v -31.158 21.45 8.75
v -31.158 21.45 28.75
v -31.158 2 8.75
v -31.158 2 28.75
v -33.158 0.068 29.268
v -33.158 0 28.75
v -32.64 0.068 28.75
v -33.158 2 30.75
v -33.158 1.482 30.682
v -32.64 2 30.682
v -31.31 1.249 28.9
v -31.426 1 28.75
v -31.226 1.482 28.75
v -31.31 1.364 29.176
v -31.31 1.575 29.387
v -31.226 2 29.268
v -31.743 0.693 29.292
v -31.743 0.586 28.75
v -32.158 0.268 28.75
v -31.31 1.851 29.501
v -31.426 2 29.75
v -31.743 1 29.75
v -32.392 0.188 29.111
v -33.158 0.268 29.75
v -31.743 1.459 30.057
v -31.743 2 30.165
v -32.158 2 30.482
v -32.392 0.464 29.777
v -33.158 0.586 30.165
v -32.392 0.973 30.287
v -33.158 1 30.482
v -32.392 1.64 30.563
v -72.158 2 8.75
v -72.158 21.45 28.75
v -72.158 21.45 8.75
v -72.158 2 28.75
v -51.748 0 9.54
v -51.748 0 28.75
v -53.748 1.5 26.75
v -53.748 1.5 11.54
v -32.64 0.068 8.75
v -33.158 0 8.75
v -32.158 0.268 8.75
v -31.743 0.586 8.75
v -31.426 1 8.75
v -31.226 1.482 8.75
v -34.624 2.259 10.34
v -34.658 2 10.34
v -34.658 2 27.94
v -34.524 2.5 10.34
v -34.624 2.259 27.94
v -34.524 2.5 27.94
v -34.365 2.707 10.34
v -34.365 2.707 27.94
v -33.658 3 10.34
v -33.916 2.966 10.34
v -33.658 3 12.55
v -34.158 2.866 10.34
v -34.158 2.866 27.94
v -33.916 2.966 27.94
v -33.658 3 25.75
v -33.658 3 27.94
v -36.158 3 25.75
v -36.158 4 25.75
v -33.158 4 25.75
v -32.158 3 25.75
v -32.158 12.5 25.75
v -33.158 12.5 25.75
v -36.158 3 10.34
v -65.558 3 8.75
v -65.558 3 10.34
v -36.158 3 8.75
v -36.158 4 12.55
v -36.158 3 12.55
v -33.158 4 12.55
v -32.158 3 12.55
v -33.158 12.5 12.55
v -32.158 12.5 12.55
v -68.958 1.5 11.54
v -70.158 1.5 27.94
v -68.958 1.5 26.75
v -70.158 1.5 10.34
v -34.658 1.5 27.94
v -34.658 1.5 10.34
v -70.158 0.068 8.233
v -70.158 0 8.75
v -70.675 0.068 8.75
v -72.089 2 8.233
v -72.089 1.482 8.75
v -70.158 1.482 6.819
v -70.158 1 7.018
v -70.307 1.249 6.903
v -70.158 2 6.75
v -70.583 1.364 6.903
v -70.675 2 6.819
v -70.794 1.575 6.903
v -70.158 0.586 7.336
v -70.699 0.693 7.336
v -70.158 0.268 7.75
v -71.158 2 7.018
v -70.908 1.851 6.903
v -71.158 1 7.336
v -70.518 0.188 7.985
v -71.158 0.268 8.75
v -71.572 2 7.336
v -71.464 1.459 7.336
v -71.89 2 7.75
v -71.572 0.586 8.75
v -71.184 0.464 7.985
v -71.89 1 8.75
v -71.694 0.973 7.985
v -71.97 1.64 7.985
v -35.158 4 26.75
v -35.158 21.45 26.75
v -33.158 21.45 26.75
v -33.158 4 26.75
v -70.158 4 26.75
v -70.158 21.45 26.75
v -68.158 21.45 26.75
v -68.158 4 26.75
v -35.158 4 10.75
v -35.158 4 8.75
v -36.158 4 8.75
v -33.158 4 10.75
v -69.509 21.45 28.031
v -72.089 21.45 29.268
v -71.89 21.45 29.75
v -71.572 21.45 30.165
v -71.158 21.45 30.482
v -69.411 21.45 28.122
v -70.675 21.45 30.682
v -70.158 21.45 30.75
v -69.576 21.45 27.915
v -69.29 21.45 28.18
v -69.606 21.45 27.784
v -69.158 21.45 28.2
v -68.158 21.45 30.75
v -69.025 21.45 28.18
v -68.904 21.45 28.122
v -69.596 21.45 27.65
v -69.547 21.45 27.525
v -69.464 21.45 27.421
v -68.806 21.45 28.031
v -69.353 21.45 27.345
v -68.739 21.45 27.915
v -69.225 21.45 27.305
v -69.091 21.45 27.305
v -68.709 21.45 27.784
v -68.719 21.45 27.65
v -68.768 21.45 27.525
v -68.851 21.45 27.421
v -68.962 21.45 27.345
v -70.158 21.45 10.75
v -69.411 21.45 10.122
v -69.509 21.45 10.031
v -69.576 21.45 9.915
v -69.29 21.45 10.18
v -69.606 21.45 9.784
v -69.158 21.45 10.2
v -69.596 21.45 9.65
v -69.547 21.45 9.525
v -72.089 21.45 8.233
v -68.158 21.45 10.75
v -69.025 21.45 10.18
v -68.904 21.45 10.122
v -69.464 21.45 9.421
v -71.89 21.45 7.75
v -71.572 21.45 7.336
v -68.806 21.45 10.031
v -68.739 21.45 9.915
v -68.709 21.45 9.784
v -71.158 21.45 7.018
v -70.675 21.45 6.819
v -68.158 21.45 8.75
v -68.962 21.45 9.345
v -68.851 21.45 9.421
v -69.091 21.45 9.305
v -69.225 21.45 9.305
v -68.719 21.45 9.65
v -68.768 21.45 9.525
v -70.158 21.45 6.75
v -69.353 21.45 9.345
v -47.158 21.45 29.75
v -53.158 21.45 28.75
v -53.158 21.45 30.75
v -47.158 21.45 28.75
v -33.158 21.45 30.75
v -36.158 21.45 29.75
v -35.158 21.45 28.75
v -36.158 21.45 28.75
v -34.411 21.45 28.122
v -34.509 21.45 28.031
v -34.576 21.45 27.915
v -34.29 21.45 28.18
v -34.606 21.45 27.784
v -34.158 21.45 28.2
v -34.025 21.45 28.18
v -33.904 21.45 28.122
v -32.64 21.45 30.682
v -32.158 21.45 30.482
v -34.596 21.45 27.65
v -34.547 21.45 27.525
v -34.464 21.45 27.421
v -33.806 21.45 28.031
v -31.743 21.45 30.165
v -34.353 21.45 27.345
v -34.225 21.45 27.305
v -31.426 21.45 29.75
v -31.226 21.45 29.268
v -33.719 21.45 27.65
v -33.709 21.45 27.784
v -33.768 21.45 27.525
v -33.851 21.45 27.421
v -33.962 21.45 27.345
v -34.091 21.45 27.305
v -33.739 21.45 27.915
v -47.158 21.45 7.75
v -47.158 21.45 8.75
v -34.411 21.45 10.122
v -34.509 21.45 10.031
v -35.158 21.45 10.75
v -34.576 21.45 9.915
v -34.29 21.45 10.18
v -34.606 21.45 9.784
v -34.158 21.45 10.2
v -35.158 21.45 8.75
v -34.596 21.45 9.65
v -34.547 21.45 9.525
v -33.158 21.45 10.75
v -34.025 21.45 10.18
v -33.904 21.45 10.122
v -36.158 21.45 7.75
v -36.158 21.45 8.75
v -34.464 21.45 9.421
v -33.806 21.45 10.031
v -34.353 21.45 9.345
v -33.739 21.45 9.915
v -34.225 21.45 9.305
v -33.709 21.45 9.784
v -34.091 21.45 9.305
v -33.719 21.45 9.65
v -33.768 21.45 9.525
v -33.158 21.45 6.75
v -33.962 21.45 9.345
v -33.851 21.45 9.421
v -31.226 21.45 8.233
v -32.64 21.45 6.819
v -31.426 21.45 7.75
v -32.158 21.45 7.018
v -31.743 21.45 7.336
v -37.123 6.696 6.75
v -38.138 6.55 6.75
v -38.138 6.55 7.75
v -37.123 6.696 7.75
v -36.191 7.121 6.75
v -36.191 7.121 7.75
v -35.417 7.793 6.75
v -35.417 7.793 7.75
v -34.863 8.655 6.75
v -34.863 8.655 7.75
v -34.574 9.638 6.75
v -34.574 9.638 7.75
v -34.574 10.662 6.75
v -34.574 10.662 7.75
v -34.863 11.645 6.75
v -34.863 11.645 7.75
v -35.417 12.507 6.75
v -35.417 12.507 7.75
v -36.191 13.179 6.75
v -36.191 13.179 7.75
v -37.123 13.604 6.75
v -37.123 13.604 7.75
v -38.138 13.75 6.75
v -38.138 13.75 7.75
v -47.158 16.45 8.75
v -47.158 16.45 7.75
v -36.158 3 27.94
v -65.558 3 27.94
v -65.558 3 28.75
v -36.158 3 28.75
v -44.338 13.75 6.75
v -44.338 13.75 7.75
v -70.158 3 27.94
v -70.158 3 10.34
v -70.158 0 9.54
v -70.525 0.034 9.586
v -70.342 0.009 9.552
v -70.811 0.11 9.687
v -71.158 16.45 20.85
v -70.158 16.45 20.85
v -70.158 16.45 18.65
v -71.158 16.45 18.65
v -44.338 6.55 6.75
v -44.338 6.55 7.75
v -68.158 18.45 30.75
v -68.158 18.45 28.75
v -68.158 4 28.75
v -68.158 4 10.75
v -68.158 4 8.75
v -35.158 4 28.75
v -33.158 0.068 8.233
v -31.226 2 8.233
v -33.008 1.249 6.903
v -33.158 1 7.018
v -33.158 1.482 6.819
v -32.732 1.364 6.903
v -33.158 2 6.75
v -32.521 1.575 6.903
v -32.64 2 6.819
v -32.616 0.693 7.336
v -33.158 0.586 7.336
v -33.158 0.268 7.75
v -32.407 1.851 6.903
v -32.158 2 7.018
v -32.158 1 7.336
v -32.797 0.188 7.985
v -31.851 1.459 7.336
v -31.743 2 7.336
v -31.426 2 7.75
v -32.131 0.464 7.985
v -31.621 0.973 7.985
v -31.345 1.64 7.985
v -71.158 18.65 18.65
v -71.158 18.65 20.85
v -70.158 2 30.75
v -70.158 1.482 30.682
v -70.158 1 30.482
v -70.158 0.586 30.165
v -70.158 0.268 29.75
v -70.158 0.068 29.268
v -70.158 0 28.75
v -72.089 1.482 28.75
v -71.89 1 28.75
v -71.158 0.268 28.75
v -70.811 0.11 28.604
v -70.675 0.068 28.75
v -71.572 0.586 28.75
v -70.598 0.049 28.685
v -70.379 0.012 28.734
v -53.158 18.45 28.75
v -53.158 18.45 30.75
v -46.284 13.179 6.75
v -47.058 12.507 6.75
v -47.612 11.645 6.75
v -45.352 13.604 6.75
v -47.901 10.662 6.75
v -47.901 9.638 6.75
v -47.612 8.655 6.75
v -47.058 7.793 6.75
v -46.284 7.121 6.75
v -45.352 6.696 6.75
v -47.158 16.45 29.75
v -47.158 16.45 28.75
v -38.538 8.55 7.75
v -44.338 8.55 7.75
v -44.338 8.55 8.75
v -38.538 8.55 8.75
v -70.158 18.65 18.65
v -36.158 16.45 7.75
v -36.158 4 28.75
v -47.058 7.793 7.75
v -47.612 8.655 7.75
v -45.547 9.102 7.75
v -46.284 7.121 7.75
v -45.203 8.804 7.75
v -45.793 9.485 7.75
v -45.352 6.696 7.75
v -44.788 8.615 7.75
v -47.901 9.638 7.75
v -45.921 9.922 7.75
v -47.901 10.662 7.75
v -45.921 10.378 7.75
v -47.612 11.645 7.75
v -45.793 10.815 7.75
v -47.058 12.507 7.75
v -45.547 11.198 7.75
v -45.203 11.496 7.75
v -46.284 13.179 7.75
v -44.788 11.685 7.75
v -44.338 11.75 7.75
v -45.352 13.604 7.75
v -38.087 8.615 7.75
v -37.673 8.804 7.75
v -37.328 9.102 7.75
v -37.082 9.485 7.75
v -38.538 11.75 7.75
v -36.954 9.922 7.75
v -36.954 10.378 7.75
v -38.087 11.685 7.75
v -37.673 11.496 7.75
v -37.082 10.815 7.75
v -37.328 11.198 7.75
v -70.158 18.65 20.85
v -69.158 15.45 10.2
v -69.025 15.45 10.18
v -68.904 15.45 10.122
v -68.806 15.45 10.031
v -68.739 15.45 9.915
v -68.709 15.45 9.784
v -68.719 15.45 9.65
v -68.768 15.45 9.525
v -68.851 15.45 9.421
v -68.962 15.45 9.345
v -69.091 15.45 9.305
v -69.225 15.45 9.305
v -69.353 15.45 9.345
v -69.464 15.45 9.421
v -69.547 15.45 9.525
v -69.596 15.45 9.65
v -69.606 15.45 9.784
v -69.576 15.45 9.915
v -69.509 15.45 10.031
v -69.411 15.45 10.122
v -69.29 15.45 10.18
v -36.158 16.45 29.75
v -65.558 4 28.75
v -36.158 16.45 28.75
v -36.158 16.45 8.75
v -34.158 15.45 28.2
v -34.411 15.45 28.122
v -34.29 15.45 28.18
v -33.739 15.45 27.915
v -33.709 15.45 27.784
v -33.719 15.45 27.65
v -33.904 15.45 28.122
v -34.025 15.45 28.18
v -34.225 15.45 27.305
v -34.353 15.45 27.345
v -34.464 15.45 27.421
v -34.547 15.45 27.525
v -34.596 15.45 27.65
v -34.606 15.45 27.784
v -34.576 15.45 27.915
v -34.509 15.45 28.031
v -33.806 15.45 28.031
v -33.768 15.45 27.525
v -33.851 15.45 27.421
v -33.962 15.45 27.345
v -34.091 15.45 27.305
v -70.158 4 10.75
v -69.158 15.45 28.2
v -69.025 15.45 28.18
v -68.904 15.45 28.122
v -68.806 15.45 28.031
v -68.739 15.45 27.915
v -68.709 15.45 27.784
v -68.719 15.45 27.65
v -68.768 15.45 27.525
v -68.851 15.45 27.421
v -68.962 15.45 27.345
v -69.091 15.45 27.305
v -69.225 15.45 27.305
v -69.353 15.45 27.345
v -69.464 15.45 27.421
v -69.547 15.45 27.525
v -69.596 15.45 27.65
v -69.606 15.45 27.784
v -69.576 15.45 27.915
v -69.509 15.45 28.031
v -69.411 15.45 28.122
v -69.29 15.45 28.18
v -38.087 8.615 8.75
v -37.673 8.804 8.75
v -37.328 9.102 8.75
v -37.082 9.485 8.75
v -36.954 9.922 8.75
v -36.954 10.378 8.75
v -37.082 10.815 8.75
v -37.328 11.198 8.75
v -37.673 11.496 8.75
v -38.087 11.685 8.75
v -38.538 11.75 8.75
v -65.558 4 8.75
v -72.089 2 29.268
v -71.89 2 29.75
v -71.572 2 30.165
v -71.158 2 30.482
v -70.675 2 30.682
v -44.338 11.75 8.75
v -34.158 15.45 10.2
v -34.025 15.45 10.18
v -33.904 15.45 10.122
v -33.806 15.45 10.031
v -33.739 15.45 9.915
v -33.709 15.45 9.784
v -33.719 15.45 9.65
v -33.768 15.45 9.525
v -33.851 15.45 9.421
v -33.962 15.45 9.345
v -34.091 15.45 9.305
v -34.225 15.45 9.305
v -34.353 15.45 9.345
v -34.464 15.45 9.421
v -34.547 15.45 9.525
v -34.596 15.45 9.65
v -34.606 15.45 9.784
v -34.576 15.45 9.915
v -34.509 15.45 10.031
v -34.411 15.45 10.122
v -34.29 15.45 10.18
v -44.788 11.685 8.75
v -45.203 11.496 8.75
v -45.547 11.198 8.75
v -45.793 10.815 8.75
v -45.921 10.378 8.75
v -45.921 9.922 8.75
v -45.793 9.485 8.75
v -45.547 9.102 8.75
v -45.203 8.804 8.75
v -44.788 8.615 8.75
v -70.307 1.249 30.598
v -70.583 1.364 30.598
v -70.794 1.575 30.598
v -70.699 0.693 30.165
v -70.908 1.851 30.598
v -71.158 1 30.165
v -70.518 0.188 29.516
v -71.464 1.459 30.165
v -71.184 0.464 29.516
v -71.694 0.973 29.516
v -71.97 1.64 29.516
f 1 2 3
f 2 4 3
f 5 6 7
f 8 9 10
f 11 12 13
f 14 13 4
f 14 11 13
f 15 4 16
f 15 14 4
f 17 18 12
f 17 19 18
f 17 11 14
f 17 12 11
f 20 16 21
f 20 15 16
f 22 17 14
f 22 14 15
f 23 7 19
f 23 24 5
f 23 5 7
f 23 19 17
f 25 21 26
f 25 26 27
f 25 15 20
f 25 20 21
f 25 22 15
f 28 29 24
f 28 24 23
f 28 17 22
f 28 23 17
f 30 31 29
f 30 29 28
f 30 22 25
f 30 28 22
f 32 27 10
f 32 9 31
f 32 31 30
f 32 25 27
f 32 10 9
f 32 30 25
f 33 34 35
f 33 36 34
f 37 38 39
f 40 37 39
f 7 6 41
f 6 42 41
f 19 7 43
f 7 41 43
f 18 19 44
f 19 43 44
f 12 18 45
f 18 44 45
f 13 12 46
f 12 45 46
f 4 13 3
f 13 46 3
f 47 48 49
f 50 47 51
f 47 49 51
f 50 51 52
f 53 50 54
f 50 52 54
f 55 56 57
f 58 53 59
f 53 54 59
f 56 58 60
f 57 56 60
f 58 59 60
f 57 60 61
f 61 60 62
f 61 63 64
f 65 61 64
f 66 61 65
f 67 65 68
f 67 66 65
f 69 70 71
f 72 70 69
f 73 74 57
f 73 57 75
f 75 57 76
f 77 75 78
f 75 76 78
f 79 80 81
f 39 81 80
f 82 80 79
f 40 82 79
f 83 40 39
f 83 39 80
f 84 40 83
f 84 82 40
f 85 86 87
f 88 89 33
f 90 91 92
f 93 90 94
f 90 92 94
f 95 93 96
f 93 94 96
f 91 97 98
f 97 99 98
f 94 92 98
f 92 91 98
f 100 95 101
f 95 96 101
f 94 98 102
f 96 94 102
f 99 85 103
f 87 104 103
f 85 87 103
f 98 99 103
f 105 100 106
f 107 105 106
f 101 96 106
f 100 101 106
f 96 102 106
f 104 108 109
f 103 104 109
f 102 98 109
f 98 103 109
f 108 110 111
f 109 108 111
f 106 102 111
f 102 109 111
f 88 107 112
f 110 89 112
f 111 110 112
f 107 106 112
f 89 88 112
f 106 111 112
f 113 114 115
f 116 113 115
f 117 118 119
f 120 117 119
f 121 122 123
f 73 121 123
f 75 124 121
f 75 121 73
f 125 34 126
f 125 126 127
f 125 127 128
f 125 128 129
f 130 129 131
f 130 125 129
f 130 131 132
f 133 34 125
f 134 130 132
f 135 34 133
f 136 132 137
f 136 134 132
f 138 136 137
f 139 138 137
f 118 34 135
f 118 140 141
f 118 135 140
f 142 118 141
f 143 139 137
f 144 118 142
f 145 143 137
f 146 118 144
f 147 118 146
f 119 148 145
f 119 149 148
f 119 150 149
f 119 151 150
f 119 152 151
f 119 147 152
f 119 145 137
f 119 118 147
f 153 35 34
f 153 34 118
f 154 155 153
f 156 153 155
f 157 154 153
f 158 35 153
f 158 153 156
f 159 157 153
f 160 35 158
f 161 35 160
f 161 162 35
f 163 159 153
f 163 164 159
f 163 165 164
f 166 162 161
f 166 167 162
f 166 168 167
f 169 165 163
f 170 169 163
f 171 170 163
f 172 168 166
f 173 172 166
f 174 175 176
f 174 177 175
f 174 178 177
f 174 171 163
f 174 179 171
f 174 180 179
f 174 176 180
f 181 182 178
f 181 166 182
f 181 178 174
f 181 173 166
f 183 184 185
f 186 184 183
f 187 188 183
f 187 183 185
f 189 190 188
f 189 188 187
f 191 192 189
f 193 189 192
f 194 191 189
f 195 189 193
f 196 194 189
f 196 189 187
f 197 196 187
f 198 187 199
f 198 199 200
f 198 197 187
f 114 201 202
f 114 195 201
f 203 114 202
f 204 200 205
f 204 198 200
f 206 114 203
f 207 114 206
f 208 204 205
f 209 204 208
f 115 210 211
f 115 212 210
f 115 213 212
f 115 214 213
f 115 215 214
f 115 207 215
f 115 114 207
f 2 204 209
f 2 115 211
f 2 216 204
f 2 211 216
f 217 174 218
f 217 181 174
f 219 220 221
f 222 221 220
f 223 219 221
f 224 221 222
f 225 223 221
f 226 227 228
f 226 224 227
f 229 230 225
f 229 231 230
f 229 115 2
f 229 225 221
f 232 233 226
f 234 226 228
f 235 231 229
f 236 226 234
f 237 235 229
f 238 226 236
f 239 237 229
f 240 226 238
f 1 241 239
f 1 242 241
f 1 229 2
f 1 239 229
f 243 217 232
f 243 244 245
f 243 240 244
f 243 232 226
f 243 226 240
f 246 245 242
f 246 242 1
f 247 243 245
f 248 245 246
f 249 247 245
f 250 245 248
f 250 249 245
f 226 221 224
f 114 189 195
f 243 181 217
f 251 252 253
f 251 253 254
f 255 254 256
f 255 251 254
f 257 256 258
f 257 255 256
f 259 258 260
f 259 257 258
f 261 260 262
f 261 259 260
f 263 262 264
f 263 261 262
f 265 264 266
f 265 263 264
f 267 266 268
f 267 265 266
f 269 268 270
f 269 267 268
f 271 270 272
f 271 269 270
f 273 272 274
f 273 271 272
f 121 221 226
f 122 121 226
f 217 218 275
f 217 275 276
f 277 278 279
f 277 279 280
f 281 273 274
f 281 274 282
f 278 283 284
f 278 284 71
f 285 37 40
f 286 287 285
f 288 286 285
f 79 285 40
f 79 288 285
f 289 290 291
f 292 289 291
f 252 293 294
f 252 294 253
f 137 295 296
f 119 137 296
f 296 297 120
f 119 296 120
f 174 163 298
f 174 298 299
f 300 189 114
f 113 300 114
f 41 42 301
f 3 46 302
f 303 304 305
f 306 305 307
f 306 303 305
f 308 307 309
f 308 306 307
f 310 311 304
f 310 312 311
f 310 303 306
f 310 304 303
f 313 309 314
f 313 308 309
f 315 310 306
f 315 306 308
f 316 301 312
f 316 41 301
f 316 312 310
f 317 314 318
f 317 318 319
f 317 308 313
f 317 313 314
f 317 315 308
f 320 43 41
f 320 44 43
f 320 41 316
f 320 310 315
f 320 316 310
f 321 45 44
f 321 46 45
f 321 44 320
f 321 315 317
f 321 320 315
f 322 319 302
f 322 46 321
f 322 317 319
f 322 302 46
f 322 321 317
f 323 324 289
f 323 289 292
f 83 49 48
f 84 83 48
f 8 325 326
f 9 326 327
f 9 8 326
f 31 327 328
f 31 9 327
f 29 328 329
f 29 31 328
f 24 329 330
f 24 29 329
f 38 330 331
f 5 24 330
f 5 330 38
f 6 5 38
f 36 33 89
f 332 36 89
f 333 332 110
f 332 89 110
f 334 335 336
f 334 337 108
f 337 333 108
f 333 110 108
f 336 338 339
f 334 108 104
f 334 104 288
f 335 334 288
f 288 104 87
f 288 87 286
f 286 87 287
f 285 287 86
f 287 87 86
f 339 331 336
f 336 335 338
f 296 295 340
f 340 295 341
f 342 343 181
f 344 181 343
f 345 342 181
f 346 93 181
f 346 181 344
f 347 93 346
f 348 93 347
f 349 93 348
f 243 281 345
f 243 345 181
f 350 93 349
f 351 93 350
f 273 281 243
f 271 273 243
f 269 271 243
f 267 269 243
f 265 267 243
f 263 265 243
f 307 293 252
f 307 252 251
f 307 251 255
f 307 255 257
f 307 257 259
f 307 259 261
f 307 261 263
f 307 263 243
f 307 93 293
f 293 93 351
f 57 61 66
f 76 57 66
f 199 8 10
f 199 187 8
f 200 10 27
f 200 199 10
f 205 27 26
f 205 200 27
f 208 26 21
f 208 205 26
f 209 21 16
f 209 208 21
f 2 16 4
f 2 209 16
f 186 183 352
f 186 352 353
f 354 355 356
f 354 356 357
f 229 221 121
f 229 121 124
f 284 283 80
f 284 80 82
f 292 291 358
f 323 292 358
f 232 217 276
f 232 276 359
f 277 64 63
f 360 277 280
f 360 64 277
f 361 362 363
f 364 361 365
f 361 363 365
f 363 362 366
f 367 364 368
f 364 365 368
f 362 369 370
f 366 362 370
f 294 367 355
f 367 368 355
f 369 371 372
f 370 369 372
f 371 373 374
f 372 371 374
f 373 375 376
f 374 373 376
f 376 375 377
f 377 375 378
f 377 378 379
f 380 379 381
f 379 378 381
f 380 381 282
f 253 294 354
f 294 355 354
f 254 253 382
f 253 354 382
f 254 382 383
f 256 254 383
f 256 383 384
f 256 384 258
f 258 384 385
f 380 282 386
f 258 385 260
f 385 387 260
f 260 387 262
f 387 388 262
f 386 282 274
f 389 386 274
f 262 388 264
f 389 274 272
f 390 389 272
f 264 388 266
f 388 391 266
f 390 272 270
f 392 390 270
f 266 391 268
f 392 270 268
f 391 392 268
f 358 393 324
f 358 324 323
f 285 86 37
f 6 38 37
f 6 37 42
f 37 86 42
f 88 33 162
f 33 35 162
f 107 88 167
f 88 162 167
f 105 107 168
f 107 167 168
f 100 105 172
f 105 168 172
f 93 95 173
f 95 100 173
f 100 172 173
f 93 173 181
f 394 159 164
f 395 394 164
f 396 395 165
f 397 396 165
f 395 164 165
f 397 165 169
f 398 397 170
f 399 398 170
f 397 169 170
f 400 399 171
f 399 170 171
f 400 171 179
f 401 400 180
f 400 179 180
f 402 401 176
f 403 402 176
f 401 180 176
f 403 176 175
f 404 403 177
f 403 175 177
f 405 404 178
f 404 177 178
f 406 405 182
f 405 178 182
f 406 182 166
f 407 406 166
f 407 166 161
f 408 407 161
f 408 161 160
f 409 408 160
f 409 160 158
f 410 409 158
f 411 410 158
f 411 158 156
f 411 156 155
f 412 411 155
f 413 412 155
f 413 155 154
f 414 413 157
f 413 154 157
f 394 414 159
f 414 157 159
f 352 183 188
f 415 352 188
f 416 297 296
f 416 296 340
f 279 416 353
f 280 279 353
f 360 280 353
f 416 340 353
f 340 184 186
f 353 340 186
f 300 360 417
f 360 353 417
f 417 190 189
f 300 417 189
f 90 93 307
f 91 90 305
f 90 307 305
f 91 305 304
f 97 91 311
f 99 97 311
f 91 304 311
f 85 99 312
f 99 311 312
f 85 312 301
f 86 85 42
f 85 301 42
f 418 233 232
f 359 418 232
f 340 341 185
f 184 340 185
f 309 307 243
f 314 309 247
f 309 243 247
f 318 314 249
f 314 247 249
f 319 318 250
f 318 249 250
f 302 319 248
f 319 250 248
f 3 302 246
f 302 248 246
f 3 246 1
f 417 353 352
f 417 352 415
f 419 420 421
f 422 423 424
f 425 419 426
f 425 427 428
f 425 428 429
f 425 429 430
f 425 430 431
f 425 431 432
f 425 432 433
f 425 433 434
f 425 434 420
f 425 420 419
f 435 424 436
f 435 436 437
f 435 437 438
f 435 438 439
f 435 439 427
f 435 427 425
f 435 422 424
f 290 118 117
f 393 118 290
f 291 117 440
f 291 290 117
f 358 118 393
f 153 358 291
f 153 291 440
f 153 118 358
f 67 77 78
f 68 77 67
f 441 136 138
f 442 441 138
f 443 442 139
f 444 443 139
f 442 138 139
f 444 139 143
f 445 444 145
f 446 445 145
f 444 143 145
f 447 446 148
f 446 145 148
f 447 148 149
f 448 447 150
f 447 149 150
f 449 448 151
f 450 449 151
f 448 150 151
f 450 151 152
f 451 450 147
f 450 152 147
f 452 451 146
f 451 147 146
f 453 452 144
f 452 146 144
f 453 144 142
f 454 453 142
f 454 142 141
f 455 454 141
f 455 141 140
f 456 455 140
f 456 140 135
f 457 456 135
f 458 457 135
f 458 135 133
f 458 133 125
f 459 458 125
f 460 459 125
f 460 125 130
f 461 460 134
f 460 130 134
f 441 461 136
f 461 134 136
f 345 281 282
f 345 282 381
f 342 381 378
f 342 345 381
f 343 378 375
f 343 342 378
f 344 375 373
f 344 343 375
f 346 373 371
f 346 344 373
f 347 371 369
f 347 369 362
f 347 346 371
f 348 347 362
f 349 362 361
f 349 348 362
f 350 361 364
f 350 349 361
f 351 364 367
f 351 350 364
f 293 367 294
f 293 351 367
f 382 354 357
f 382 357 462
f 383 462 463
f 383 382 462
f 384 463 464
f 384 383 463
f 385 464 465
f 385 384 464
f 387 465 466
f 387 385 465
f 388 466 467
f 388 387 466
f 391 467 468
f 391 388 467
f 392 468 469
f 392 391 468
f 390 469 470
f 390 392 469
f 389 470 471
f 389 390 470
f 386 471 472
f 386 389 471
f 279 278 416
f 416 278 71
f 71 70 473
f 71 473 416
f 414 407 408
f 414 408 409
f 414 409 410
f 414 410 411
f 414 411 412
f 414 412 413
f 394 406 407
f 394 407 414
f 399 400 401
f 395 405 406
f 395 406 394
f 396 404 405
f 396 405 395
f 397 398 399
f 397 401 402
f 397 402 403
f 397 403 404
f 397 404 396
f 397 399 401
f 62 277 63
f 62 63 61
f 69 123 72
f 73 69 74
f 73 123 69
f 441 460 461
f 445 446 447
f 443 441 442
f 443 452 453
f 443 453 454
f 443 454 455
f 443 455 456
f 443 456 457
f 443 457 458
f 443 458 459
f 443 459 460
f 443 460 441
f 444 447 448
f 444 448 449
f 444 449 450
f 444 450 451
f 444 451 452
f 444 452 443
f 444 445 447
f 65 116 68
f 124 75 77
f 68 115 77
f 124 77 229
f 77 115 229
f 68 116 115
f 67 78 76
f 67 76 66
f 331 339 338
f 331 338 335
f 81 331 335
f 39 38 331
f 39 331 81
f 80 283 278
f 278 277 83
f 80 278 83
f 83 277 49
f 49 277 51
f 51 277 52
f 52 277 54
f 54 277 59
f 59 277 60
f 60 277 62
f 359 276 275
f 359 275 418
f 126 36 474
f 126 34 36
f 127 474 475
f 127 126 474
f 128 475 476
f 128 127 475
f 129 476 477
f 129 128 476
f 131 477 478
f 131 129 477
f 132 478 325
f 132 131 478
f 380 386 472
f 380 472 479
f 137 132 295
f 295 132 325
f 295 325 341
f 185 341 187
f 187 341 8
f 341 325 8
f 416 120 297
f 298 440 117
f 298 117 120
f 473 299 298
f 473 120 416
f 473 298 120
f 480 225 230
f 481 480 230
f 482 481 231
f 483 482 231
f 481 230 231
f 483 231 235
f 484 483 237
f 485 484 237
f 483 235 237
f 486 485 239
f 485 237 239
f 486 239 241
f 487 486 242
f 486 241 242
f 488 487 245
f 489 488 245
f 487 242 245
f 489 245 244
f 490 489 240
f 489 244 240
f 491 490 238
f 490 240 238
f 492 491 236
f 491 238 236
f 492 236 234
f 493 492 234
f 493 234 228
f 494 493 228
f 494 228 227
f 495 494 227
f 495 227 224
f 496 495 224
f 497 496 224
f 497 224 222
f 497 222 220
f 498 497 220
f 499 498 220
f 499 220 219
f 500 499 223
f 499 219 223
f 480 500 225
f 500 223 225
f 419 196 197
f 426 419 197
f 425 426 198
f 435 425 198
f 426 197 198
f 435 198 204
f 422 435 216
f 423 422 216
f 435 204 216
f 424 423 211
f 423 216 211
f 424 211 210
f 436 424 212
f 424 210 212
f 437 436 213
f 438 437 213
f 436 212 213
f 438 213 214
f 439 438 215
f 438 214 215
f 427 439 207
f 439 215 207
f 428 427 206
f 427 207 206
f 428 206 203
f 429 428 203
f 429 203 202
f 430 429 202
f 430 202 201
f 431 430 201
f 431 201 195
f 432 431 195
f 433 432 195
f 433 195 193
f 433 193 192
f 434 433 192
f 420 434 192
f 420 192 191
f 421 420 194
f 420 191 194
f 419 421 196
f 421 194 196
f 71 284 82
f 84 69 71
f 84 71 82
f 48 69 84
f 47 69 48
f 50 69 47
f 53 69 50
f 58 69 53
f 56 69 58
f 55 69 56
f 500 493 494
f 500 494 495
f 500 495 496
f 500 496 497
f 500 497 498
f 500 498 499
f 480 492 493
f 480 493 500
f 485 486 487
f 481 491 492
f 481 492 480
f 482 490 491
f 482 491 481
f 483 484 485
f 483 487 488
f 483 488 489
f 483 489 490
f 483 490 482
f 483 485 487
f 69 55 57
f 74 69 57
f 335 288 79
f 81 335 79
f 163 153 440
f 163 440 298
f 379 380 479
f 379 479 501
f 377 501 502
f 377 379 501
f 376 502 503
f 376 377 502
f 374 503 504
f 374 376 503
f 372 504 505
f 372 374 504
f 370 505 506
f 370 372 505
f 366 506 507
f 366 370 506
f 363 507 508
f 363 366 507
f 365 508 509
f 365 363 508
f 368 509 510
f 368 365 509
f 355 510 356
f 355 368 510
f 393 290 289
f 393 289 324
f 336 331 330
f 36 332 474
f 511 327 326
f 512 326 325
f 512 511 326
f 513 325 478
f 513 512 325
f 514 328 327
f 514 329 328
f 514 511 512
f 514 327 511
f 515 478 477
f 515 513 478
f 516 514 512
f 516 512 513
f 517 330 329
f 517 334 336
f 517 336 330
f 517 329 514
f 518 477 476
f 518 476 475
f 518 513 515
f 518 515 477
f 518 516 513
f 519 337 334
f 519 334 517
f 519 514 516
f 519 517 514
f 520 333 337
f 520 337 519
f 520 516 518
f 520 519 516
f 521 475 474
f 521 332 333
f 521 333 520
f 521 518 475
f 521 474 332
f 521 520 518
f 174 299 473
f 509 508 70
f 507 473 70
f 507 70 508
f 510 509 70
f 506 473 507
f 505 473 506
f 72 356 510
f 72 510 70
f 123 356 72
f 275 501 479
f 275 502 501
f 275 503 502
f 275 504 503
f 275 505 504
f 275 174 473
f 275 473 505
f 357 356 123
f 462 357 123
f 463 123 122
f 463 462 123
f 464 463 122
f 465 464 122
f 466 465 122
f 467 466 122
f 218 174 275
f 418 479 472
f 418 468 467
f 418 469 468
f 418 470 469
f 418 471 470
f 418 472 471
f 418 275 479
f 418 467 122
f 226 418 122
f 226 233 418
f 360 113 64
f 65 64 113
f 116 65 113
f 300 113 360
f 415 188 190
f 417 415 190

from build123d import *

# Parameters (mm, degrees)
SKETCH_1_W           = 41
SKETCH_1_H           = 24
EXTRUDE_1_DEPTH      = 21.45
SKETCH_2_W           = 37
SKETCH_2_H           = 20
CUT_EXTRUDE_1_DEPTH  = 18.45
SKETCH_4_W           = 15.21
SKETCH_4_H           = 15.21
CUT_EXTRUDE_2_DEPTH  = 15
SKETCH_6_W           = 15
SKETCH_6_H           = 3
CUT_EXTRUDE_4_DEPTH  = 5
CUT_EXTRUDE_7_DEPTH  = 1
CUT_EXTRUDE_8_DEPTH  = 1
SKETCH_11_W          = 35.5
SKETCH_11_H          = 17.6
CUT_EXTRUDE_10_DEPTH = 1.5
SKETCH_13_W          = 11
SKETCH_13_H          = 1
CUT_EXTRUDE_12_DEPTH = 5
FILLET_2_R           = 2
CHAMFER_2_SIZE       = 2
CHAMFER_2_SIZE_2     = 1.5
SKETCH_19_W          = 2.2
SKETCH_19_H          = 2.2
CUT_EXTRUDE_16_DEPTH = 1
SKETCH_21_W          = 3.8
SKETCH_21_H          = 1
SKETCH_21_W_2        = 3
EXTRUDE_4_DEPTH      = 3
FILLET_8_R           = 1
SKETCH_24_W          = 13.2
SKETCH_24_H          = 9.5
CUT_EXTRUDE_17_DEPTH = 1
EXTRUDE_6_REACH      = 80.427
SKETCH_27_W          = 4.6
SKETCH_27_H          = 1
SKETCH_28_W          = 2
SKETCH_28_H          = 2
EXTRUDE_7_DEPTH      = 17.45
SKETCH_29_R          = 0.45
CUT_EXTRUDE_18_DEPTH = 6


with BuildPart() as part:
    # 草图1 → 凸台-拉伸1 (new body)
    with BuildSketch(Plane(origin=(0, 0, 0), x_dir=(1, 0, 0), z_dir=(0, 1, 0))):
        with Locations((-51.657577391, -18.750418409)):
            Rectangle(SKETCH_1_W, SKETCH_1_H)
    extrude(amount=EXTRUDE_1_DEPTH)

    # 草图2 → 切除-拉伸1 (cut)
    with BuildSketch(Plane(origin=(0, 21.45, 0), x_dir=(1, 0, 0), z_dir=(0, 1, 0))):
        with Locations((-51.657577391, -18.750418409)):
            Rectangle(SKETCH_2_W, SKETCH_2_H)
    extrude(amount=-CUT_EXTRUDE_1_DEPTH, mode=Mode.SUBTRACT)

    # 草图4 → 切除-拉伸2 (cut)
    with BuildSketch(Plane(origin=(0, 0, 0), x_dir=(-1, 0, 0), z_dir=(0, -1, 0))):
        with Locations((61.352577391, -19.145418409)):
            Rectangle(SKETCH_4_W, SKETCH_4_H)
    extrude(amount=-CUT_EXTRUDE_2_DEPTH, mode=Mode.SUBTRACT)

    # 草图6 → 切除-拉伸4 (cut)
    with BuildSketch(Plane.XY.offset(30.750418409)):
        with Locations((-60.657577391, 19.95)):
            Rectangle(SKETCH_6_W, SKETCH_6_H)
    extrude(amount=-CUT_EXTRUDE_4_DEPTH, mode=Mode.SUBTRACT)

    # 草图7 → 切除-拉伸7 (cut)
    with BuildSketch(Plane(origin=(0, 0, 6.750418409), x_dir=(-1, 0, 0), z_dir=(0, 0, -1))):
        with BuildLine():
            Line((44.337577391, 6.55), (38.137577391, 6.55))
            ThreePointArc((38.137577391, 6.55), (34.537577391, 10.15), (38.137577391, 13.75))
            Line((38.137577391, 13.75), (44.337577391, 13.75))
            ThreePointArc((44.337577391, 13.75), (47.937577391, 10.15), (44.337577391, 6.55))
        make_face()
    extrude(amount=-CUT_EXTRUDE_7_DEPTH, mode=Mode.SUBTRACT)

    # 草图9 → 切除-拉伸8 (cut)
    with BuildSketch(Plane(origin=(0, 0, 7.750418409), x_dir=(-1, 0, 0), z_dir=(0, 0, -1))):
        with BuildLine():
            Line((44.337577391, 8.55), (38.537577391, 8.55))
            ThreePointArc((38.537577391, 8.55), (36.937577391, 10.15), (38.537577391, 11.75))
            Line((38.537577391, 11.75), (44.337577391, 11.75))
            ThreePointArc((44.337577391, 11.75), (45.937577391, 10.15), (44.337577391, 8.55))
        make_face()
    extrude(amount=-CUT_EXTRUDE_8_DEPTH, mode=Mode.SUBTRACT)

    # 草图11 → 切除-拉伸10 (cut)
    with BuildSketch(Plane(origin=(0, 3, 0), x_dir=(1, 0, 0), z_dir=(0, 1, 0))):
        with Locations((-52.407577391, -19.140418409)):
            Rectangle(SKETCH_11_W, SKETCH_11_H)
    extrude(amount=-CUT_EXTRUDE_10_DEPTH, mode=Mode.SUBTRACT)

    # 草图13 → 切除-拉伸12 (cut)
    with BuildSketch(Plane(origin=(0, 21.45, 0), x_dir=(1, 0, 0), z_dir=(0, 1, 0))):
        with Locations((-41.657577391, -29.250418409)):
            Rectangle(SKETCH_13_W, SKETCH_13_H)
        with Locations((-41.657577391, -8.250418409)):
            Rectangle(SKETCH_13_W, SKETCH_13_H)
    extrude(amount=-CUT_EXTRUDE_12_DEPTH, mode=Mode.SUBTRACT)

    # 圆角2
    fillet_2_edges = [part.edges().sort_by_distance(p)[0] for p in [
        (-72.157577391, 0, 18.750418409),
        (-51.657577391, 0, 30.750418409),
        (-31.157577391, 0, 18.750418409),
        (-51.657577391, 0, 6.750418409),
        (-72.157577391, 10.725, 6.750418409),
        (-72.157577391, 10.725, 30.750418409),
        (-31.157577391, 10.725, 30.750418409),
        (-31.157577391, 10.725, 6.750418409),
    ]]
    fillet(fillet_2_edges, radius=FILLET_2_R)

    # 倒角2
    # the kernel refuses this chamfer: 2, 1.5 mm, written as the material it takes off along each edge
    with BuildSketch(Plane(origin=(-53.747577391, 0, 26.750418409), x_dir=(0, -0.02324952774876386, 0.9997296931968459), z_dir=(-1, 0, 0)), Plane(origin=(-53.747577391, 0, 11.540418409), x_dir=(0.9997296931968459, -0.02324952774876386, 0), z_dir=(0, 0, 1)), Plane(origin=(-68.957577391, 0, 11.540418409), x_dir=(0, -0.02324952774876386, -0.9997296931968459), z_dir=(1, 0, 0)), Plane(origin=(-68.957577391, 0, 26.750418409), x_dir=(-0.9997296931968459, -0.02324952774876394, 0), z_dir=(0, 0, -1))) as chamfer_2_piece_1:
        Polygon((CHAMFER_2_SIZE * 0.999729693197, CHAMFER_2_SIZE * 0.0232495277488), (-CHAMFER_2_SIZE_2 * 0.0232495277488, CHAMFER_2_SIZE_2 * 0.999729693197), (0, 0), align=None)
    extrude(amount=15.21, mode=Mode.SUBTRACT)
    with BuildSketch(Plane(origin=(-48.58618223, 0, 26.750418409), x_dir=(0, -0.02324952774876386, 0.9997296931968459), z_dir=(-1, 0, 0))) as chamfer_2_piece_2a_section:
        Polygon((CHAMFER_2_SIZE * 0.999729693197, CHAMFER_2_SIZE * 0.0232495277488), (-CHAMFER_2_SIZE_2 * 0.0232495277488, CHAMFER_2_SIZE_2 * 0.999729693197), (0, 0), align=None)
    chamfer_2_piece_2a = extrude(amount=20.37139516, mode=Mode.PRIVATE)
    chamfer_2_piece_2a = split(chamfer_2_piece_2a, bisect_by=Plane(origin=(-53.747577391, 0.488589108, 27.415308917), z_dir=(1, 0, 0)), keep=Keep.TOP, mode=Mode.PRIVATE)
    with BuildSketch(Plane(origin=(-53.747577391, 0, 11.540418409), x_dir=(0.9997296931968459, -0.02324952774876386, 0), z_dir=(0, 0, 1))) as chamfer_2_piece_2b_section:
        Polygon((CHAMFER_2_SIZE * 0.999729693197, CHAMFER_2_SIZE * 0.0232495277488), (-CHAMFER_2_SIZE_2 * 0.0232495277488, CHAMFER_2_SIZE_2 * 0.999729693197), (0, 0), align=None)
    chamfer_2_piece_2b = extrude(amount=20.37139516, mode=Mode.PRIVATE)
    chamfer_2_piece_2b = split(chamfer_2_piece_2b, bisect_by=Plane(origin=(-53.082686882, 0.488589108, 26.750418409), z_dir=(0, 0, 1)), keep=Keep.TOP, mode=Mode.PRIVATE)
    chamfer_2_piece_2 = chamfer_2_piece_2a & chamfer_2_piece_2b
    add(chamfer_2_piece_2, mode=Mode.SUBTRACT)
    with BuildSketch(Plane(origin=(-68.957577391, 0, 31.911813569), x_dir=(-0.9997296931968459, -0.02324952774876394, 0), z_dir=(0, 0, -1))) as chamfer_2_piece_3a_section:
        Polygon((CHAMFER_2_SIZE * 0.999729693197, CHAMFER_2_SIZE * 0.0232495277488), (-CHAMFER_2_SIZE_2 * 0.0232495277488, CHAMFER_2_SIZE_2 * 0.999729693197), (0, 0), align=None)
    chamfer_2_piece_3a = extrude(amount=20.37139516, mode=Mode.PRIVATE)
    chamfer_2_piece_3a = split(chamfer_2_piece_3a, bisect_by=Plane(origin=(-69.622467899, 0.488589108, 26.750418409), z_dir=(0, 0, 1)), keep=Keep.TOP, mode=Mode.PRIVATE)
    with BuildSketch(Plane(origin=(-53.747577391, 0, 26.750418409), x_dir=(0, -0.02324952774876386, 0.9997296931968459), z_dir=(-1, 0, 0))) as chamfer_2_piece_3b_section:
        Polygon((CHAMFER_2_SIZE * 0.999729693197, CHAMFER_2_SIZE * 0.0232495277488), (-CHAMFER_2_SIZE_2 * 0.0232495277488, CHAMFER_2_SIZE_2 * 0.999729693197), (0, 0), align=None)
    chamfer_2_piece_3b = extrude(amount=20.37139516, mode=Mode.PRIVATE)
    chamfer_2_piece_3b = split(chamfer_2_piece_3b, bisect_by=Plane(origin=(-68.957577391, 0.488589108, 27.415308917), z_dir=(-1, 0, 0)), keep=Keep.TOP, mode=Mode.PRIVATE)
    chamfer_2_piece_3 = chamfer_2_piece_3a & chamfer_2_piece_3b
    add(chamfer_2_piece_3, mode=Mode.SUBTRACT)
    with BuildSketch(Plane(origin=(-53.747577391, 0, 6.379023249), x_dir=(0.9997296931968459, -0.02324952774876386, 0), z_dir=(0, 0, 1))) as chamfer_2_piece_4a_section:
        Polygon((CHAMFER_2_SIZE * 0.999729693197, CHAMFER_2_SIZE * 0.0232495277488), (-CHAMFER_2_SIZE_2 * 0.0232495277488, CHAMFER_2_SIZE_2 * 0.999729693197), (0, 0), align=None)
    chamfer_2_piece_4a = extrude(amount=20.37139516, mode=Mode.PRIVATE)
    chamfer_2_piece_4a = split(chamfer_2_piece_4a, bisect_by=Plane(origin=(-53.082686882, 0.488589108, 11.540418409), z_dir=(0, 0, -1)), keep=Keep.TOP, mode=Mode.PRIVATE)
    with BuildSketch(Plane(origin=(-68.957577391, 0, 11.540418409), x_dir=(0, -0.02324952774876386, -0.9997296931968459), z_dir=(1, 0, 0))) as chamfer_2_piece_4b_section:
        Polygon((CHAMFER_2_SIZE * 0.999729693197, CHAMFER_2_SIZE * 0.0232495277488), (-CHAMFER_2_SIZE_2 * 0.0232495277488, CHAMFER_2_SIZE_2 * 0.999729693197), (0, 0), align=None)
    chamfer_2_piece_4b = extrude(amount=20.37139516, mode=Mode.PRIVATE)
    chamfer_2_piece_4b = split(chamfer_2_piece_4b, bisect_by=Plane(origin=(-53.747577391, 0.488589108, 10.875527901), z_dir=(1, 0, 0)), keep=Keep.TOP, mode=Mode.PRIVATE)
    chamfer_2_piece_4 = chamfer_2_piece_4a & chamfer_2_piece_4b
    add(chamfer_2_piece_4, mode=Mode.SUBTRACT)
    with BuildSketch(Plane(origin=(-68.957577391, 0, 26.750418409), x_dir=(-0.9997296931968459, -0.02324952774876394, 0), z_dir=(0, 0, -1))) as chamfer_2_piece_5a_section:
        Polygon((CHAMFER_2_SIZE * 0.999729693197, CHAMFER_2_SIZE * 0.0232495277488), (-CHAMFER_2_SIZE_2 * 0.0232495277488, CHAMFER_2_SIZE_2 * 0.999729693197), (0, 0), align=None)
    chamfer_2_piece_5a = extrude(amount=20.37139516, mode=Mode.PRIVATE)
    chamfer_2_piece_5a = split(chamfer_2_piece_5a, bisect_by=Plane(origin=(-69.622467899, 0.488589108, 11.540418409), z_dir=(0, 0, -1)), keep=Keep.TOP, mode=Mode.PRIVATE)
    with BuildSketch(Plane(origin=(-74.118972551, 0, 11.540418409), x_dir=(0, -0.02324952774876386, -0.9997296931968459), z_dir=(1, 0, 0))) as chamfer_2_piece_5b_section:
        Polygon((CHAMFER_2_SIZE * 0.999729693197, CHAMFER_2_SIZE * 0.0232495277488), (-CHAMFER_2_SIZE_2 * 0.0232495277488, CHAMFER_2_SIZE_2 * 0.999729693197), (0, 0), align=None)
    chamfer_2_piece_5b = extrude(amount=20.37139516, mode=Mode.PRIVATE)
    chamfer_2_piece_5b = split(chamfer_2_piece_5b, bisect_by=Plane(origin=(-68.957577391, 0.488589108, 10.875527901), z_dir=(-1, 0, 0)), keep=Keep.TOP, mode=Mode.PRIVATE)
    chamfer_2_piece_5 = chamfer_2_piece_5a & chamfer_2_piece_5b
    add(chamfer_2_piece_5, mode=Mode.SUBTRACT)

    # 草图19 → 切除-拉伸16 (cut)
    with BuildSketch(Plane(origin=(-70.157577391, 0, 0), x_dir=(0, 0, -1), z_dir=(1, 0, 0))):
        with Locations((-19.750418409, 17.55)):
            Rectangle(SKETCH_19_W, SKETCH_19_H)
    extrude(amount=-CUT_EXTRUDE_16_DEPTH, mode=Mode.SUBTRACT)

    # 草图21 → 凸台-拉伸4 (add)
    with BuildSketch(Plane.ZY.offset(33.157577391)):
        with Locations((10.650418409, 3.5)):
            Rectangle(SKETCH_21_W, SKETCH_21_H)
        with Locations((27.250418409, 3.5)):
            Rectangle(SKETCH_21_W_2, SKETCH_21_H)
    extrude(amount=EXTRUDE_4_DEPTH)

    # 圆角8
    # the kernel refuses this fillet: 1 mm, written as the material it takes off along each edge
    with BuildSketch(Plane(origin=(-34.657577391, 3, 28.250418409), x_dir=(1, 0, 0), z_dir=(0, 0, -1))) as fillet_8_piece_1_section:
        with BuildLine():
            CenterArc((FILLET_8_R, FILLET_8_R), FILLET_8_R, 180, 90)
            Line((0, FILLET_8_R), (0, 0))
            Line((0, 0), (FILLET_8_R, 0))
        make_face()
    fillet_8_piece_1 = extrude(amount=15.7, mode=Mode.PRIVATE)
    fillet_8_piece_1 = split(fillet_8_piece_1, bisect_by=Plane(origin=(-34.454104261, 2.75304895, 27.940418409), z_dir=(0, 0, -1)), keep=Keep.TOP, mode=Mode.PRIVATE)
    fillet_8_piece_1 = split(fillet_8_piece_1, bisect_by=Plane(origin=(-34.454104261, 2.75304895, 25.750418409), z_dir=(0, 0, 1)), keep=Keep.TOP, mode=Mode.PRIVATE)
    fillet_8_piece_1 = split(fillet_8_piece_1, bisect_by=Plane(origin=(-34.454104261, 3, 26.845418409), z_dir=(0, -1, 0)), keep=Keep.TOP, mode=Mode.PRIVATE)
    add(fillet_8_piece_1, mode=Mode.SUBTRACT)
    with BuildSketch(Plane(origin=(-34.657577391, 3, 25.750418409), x_dir=(1, 0, 0), z_dir=(0, 0, -1))) as fillet_8_piece_2_section:
        with BuildLine():
            CenterArc((FILLET_8_R, FILLET_8_R), FILLET_8_R, 180, 90)
            Line((0, FILLET_8_R), (0, 0))
            Line((0, 0), (FILLET_8_R, 0))
        make_face()
    fillet_8_piece_2 = extrude(amount=13.2, mode=Mode.PRIVATE)
    fillet_8_piece_2 = split(fillet_8_piece_2, bisect_by=Plane(origin=(-34.454104261, 3, 19.150418409), z_dir=(0, -1, 0)), keep=Keep.TOP, mode=Mode.PRIVATE)
    add(fillet_8_piece_2, mode=Mode.SUBTRACT)
    with BuildSketch(Plane(origin=(-34.657577391, 3, 25.750418409), x_dir=(1, 0, 0), z_dir=(0, 0, -1))) as fillet_8_piece_3_section:
        with BuildLine():
            CenterArc((FILLET_8_R, FILLET_8_R), FILLET_8_R, 180, 90)
            Line((0, FILLET_8_R), (0, 0))
            Line((0, 0), (FILLET_8_R, 0))
        make_face()
    fillet_8_piece_3 = extrude(amount=15.7, mode=Mode.PRIVATE)
    fillet_8_piece_3 = split(fillet_8_piece_3, bisect_by=Plane(origin=(-34.454104261, 2.75304895, 10.340418409), z_dir=(0, 0, 1)), keep=Keep.TOP, mode=Mode.PRIVATE)
    fillet_8_piece_3 = split(fillet_8_piece_3, bisect_by=Plane(origin=(-34.454104261, 2.75304895, 12.550418409), z_dir=(0, 0, -1)), keep=Keep.TOP, mode=Mode.PRIVATE)
    fillet_8_piece_3 = split(fillet_8_piece_3, bisect_by=Plane(origin=(-34.454104261, 3, 11.445418409), z_dir=(0, -1, 0)), keep=Keep.TOP, mode=Mode.PRIVATE)
    add(fillet_8_piece_3, mode=Mode.SUBTRACT)

    # 草图24 → 切除-拉伸17 (cut)
    with BuildSketch(Plane.ZY.offset(33.157577391)):
        with Locations((19.150418409, 7.75)):
            Rectangle(SKETCH_24_W, SKETCH_24_H)
    extrude(amount=-CUT_EXTRUDE_17_DEPTH, mode=Mode.SUBTRACT)

    # 草图27 → 凸台-拉伸6 (add, up to next)
    with BuildSketch(Plane.XY.offset(8.750418409), mode=Mode.PRIVATE) as extrude_6_sk1:
        with Locations((-67.857577391, 3.5)):
            Rectangle(SKETCH_27_W, SKETCH_27_H)
    extrude_6_tool1 = extrude(extrude_6_sk1.sketch, amount=EXTRUDE_6_REACH, mode=Mode.PRIVATE) - part.part
    add(extrude_6_tool1.solids().sort_by_distance((-67.857577, 3.5, 8.750418))[0])

    # 草图28 → 凸台-拉伸7 (add)
    with BuildSketch(Plane(origin=(0, 4, 0), x_dir=(1, 0, 0), z_dir=(0, 1, 0))):
        with Locations((-69.157577391, -9.750418409)):
            Rectangle(SKETCH_28_W, SKETCH_28_H)
        with Locations((-34.157577391, -9.750418409)):
            Rectangle(SKETCH_28_W, SKETCH_28_H)
        with Locations((-69.157577391, -27.750418409)):
            Rectangle(SKETCH_28_W, SKETCH_28_H)
        with Locations((-34.157577391, -27.750418409)):
            Rectangle(SKETCH_28_W, SKETCH_28_H)
    extrude(amount=EXTRUDE_7_DEPTH)

    # 草图29 → 切除-拉伸18 (cut)
    with BuildSketch(Plane(origin=(0, 21.45, 0), x_dir=(1, 0, 0), z_dir=(0, 1, 0))):
        with Locations(Location((-69.157577391, -9.750418409, 0), (0, 0, 270))):
            Circle(SKETCH_29_R)
        with Locations(Location((-69.157577391, -27.750418409, 0), (0, 0, 270))):
            Circle(SKETCH_29_R)
        with Locations(Location((-34.157577391, -9.750418409, 0), (0, 0, 270))):
            Circle(SKETCH_29_R)
        with Locations(Location((-34.157577391, -27.750418409, 0), (0, 0, 270))):
            Circle(SKETCH_29_R)
    extrude(amount=-CUT_EXTRUDE_18_DEPTH, mode=Mode.SUBTRACT)


solid = part.part
